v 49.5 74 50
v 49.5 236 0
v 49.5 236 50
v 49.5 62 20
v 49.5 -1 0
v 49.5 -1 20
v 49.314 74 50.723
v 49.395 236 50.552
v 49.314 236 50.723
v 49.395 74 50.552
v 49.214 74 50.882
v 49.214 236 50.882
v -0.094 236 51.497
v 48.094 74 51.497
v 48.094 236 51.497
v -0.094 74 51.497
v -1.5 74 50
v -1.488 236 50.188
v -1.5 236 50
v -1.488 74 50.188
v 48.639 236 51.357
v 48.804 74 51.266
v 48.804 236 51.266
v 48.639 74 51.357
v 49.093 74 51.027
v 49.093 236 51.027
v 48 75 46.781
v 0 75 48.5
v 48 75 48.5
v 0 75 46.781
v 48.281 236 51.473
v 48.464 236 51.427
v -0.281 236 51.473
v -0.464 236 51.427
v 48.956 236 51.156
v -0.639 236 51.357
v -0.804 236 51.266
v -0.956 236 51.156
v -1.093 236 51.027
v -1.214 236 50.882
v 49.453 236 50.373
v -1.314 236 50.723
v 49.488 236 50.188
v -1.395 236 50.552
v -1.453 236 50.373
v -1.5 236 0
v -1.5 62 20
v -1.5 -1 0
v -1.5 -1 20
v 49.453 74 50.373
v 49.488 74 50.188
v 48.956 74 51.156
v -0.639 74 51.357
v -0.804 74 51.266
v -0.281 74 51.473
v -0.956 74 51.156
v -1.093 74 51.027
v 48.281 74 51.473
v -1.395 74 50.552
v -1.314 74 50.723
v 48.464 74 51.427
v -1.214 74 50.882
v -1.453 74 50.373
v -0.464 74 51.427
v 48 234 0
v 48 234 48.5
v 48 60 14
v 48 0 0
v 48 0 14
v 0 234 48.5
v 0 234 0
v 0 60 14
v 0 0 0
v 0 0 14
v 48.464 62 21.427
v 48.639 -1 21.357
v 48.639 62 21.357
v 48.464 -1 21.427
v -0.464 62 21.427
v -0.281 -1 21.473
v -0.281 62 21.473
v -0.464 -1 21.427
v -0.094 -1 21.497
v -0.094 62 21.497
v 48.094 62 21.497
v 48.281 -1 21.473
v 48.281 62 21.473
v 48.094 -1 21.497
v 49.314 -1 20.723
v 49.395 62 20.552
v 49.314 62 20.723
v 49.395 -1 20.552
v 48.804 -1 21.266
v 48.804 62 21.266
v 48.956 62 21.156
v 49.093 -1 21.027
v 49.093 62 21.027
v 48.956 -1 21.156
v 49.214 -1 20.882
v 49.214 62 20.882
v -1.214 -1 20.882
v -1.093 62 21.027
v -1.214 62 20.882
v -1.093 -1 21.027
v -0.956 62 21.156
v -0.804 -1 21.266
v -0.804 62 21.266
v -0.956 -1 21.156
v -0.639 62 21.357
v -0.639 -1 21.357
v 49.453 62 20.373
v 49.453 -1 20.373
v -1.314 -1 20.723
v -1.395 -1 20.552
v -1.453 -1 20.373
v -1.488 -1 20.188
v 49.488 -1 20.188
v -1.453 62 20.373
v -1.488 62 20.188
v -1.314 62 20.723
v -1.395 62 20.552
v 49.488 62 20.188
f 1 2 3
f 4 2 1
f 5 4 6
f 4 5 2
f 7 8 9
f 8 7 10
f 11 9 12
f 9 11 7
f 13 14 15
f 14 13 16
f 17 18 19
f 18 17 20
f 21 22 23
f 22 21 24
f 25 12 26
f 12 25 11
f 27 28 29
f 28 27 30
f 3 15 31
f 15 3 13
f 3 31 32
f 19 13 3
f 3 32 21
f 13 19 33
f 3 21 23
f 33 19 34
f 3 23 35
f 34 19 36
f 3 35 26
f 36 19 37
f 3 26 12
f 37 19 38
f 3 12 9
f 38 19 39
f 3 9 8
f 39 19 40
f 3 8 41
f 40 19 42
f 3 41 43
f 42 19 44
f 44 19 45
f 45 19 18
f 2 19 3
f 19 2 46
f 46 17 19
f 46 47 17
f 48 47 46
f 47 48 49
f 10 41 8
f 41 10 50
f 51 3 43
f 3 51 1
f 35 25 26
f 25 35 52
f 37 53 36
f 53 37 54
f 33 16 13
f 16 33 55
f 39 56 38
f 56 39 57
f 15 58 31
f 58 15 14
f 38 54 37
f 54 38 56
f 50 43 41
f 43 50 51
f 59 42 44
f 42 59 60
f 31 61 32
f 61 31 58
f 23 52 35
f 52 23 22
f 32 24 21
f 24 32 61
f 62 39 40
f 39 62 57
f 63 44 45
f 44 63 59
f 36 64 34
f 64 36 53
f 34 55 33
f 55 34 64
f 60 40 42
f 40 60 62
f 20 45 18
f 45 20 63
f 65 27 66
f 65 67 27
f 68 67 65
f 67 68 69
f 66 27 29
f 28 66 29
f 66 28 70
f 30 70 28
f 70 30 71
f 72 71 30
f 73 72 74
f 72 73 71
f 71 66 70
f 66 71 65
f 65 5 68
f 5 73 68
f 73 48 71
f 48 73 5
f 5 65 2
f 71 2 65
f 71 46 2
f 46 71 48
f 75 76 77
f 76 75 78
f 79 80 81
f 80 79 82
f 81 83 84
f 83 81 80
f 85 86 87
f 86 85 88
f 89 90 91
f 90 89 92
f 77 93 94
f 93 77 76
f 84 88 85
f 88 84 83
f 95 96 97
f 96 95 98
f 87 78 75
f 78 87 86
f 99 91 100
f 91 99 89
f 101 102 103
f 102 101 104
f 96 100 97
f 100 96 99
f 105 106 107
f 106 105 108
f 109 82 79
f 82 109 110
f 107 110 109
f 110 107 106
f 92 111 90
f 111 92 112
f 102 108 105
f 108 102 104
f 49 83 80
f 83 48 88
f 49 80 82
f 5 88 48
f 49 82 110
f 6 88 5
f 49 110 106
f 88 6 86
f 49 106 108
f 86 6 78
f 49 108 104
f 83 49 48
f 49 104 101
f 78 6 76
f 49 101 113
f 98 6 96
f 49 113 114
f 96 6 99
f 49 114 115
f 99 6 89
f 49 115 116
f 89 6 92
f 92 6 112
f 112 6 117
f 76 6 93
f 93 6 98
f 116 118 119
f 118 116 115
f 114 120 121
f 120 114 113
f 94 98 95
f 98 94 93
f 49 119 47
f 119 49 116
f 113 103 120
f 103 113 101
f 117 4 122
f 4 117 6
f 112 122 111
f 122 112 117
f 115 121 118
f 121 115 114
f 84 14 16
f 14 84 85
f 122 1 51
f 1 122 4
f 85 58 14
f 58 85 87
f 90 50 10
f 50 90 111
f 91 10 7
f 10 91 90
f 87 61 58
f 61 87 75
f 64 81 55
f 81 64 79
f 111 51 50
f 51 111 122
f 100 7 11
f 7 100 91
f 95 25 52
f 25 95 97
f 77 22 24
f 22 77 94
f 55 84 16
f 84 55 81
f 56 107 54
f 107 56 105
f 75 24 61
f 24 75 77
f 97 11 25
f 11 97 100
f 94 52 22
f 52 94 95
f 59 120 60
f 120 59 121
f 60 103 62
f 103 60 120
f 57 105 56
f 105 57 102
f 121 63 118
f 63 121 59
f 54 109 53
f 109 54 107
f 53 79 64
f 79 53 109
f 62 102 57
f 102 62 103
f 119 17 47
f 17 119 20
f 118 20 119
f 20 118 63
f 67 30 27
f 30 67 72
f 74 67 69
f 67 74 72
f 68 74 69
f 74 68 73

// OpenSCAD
module packBat() {
    difference() {
        difference() {
            minkowski() {
                $fn = 50;
                rotate([90,0,0])        cylinder(1,1.5,1.5, false);
                cube([48,160,50], false);    
                }
            translate([0,0,-3]){cube([48,158,51.5],false);}
            }
        translate([-50,-21,-3])cube([200,200,3], false);
    }
}

module devant(longueur=75, hauteur=50, longueur2=63, hauteur2=20 ) {
    rotate([90,0,90]) 
    linear_extrude(height=48)
    polygon([[0,0],[longueur,0],[longueur,hauteur],[longueur2,hauteur2],[0,hauteur2]]);
}
module devant_fini() {
    difference() {
        difference() {
            minkowski() {
                $fn = 50;
                rotate([90,0,0])        cylinder(1,1.5,1.5, false);
                devant();
            }
        translate([0,0,-1.5])cube([200,200,3], true);
        }
        translate([0,0,-3]) devant(75.1, 50, 60, 17);
    }
}

*devant_fini();
*packBat();
difference() {
    union() {
        translate([0,76,0])packBat();
        devant_fini();
    }
    translate([0,75,0]) cube([48,10,48.5]);
}
